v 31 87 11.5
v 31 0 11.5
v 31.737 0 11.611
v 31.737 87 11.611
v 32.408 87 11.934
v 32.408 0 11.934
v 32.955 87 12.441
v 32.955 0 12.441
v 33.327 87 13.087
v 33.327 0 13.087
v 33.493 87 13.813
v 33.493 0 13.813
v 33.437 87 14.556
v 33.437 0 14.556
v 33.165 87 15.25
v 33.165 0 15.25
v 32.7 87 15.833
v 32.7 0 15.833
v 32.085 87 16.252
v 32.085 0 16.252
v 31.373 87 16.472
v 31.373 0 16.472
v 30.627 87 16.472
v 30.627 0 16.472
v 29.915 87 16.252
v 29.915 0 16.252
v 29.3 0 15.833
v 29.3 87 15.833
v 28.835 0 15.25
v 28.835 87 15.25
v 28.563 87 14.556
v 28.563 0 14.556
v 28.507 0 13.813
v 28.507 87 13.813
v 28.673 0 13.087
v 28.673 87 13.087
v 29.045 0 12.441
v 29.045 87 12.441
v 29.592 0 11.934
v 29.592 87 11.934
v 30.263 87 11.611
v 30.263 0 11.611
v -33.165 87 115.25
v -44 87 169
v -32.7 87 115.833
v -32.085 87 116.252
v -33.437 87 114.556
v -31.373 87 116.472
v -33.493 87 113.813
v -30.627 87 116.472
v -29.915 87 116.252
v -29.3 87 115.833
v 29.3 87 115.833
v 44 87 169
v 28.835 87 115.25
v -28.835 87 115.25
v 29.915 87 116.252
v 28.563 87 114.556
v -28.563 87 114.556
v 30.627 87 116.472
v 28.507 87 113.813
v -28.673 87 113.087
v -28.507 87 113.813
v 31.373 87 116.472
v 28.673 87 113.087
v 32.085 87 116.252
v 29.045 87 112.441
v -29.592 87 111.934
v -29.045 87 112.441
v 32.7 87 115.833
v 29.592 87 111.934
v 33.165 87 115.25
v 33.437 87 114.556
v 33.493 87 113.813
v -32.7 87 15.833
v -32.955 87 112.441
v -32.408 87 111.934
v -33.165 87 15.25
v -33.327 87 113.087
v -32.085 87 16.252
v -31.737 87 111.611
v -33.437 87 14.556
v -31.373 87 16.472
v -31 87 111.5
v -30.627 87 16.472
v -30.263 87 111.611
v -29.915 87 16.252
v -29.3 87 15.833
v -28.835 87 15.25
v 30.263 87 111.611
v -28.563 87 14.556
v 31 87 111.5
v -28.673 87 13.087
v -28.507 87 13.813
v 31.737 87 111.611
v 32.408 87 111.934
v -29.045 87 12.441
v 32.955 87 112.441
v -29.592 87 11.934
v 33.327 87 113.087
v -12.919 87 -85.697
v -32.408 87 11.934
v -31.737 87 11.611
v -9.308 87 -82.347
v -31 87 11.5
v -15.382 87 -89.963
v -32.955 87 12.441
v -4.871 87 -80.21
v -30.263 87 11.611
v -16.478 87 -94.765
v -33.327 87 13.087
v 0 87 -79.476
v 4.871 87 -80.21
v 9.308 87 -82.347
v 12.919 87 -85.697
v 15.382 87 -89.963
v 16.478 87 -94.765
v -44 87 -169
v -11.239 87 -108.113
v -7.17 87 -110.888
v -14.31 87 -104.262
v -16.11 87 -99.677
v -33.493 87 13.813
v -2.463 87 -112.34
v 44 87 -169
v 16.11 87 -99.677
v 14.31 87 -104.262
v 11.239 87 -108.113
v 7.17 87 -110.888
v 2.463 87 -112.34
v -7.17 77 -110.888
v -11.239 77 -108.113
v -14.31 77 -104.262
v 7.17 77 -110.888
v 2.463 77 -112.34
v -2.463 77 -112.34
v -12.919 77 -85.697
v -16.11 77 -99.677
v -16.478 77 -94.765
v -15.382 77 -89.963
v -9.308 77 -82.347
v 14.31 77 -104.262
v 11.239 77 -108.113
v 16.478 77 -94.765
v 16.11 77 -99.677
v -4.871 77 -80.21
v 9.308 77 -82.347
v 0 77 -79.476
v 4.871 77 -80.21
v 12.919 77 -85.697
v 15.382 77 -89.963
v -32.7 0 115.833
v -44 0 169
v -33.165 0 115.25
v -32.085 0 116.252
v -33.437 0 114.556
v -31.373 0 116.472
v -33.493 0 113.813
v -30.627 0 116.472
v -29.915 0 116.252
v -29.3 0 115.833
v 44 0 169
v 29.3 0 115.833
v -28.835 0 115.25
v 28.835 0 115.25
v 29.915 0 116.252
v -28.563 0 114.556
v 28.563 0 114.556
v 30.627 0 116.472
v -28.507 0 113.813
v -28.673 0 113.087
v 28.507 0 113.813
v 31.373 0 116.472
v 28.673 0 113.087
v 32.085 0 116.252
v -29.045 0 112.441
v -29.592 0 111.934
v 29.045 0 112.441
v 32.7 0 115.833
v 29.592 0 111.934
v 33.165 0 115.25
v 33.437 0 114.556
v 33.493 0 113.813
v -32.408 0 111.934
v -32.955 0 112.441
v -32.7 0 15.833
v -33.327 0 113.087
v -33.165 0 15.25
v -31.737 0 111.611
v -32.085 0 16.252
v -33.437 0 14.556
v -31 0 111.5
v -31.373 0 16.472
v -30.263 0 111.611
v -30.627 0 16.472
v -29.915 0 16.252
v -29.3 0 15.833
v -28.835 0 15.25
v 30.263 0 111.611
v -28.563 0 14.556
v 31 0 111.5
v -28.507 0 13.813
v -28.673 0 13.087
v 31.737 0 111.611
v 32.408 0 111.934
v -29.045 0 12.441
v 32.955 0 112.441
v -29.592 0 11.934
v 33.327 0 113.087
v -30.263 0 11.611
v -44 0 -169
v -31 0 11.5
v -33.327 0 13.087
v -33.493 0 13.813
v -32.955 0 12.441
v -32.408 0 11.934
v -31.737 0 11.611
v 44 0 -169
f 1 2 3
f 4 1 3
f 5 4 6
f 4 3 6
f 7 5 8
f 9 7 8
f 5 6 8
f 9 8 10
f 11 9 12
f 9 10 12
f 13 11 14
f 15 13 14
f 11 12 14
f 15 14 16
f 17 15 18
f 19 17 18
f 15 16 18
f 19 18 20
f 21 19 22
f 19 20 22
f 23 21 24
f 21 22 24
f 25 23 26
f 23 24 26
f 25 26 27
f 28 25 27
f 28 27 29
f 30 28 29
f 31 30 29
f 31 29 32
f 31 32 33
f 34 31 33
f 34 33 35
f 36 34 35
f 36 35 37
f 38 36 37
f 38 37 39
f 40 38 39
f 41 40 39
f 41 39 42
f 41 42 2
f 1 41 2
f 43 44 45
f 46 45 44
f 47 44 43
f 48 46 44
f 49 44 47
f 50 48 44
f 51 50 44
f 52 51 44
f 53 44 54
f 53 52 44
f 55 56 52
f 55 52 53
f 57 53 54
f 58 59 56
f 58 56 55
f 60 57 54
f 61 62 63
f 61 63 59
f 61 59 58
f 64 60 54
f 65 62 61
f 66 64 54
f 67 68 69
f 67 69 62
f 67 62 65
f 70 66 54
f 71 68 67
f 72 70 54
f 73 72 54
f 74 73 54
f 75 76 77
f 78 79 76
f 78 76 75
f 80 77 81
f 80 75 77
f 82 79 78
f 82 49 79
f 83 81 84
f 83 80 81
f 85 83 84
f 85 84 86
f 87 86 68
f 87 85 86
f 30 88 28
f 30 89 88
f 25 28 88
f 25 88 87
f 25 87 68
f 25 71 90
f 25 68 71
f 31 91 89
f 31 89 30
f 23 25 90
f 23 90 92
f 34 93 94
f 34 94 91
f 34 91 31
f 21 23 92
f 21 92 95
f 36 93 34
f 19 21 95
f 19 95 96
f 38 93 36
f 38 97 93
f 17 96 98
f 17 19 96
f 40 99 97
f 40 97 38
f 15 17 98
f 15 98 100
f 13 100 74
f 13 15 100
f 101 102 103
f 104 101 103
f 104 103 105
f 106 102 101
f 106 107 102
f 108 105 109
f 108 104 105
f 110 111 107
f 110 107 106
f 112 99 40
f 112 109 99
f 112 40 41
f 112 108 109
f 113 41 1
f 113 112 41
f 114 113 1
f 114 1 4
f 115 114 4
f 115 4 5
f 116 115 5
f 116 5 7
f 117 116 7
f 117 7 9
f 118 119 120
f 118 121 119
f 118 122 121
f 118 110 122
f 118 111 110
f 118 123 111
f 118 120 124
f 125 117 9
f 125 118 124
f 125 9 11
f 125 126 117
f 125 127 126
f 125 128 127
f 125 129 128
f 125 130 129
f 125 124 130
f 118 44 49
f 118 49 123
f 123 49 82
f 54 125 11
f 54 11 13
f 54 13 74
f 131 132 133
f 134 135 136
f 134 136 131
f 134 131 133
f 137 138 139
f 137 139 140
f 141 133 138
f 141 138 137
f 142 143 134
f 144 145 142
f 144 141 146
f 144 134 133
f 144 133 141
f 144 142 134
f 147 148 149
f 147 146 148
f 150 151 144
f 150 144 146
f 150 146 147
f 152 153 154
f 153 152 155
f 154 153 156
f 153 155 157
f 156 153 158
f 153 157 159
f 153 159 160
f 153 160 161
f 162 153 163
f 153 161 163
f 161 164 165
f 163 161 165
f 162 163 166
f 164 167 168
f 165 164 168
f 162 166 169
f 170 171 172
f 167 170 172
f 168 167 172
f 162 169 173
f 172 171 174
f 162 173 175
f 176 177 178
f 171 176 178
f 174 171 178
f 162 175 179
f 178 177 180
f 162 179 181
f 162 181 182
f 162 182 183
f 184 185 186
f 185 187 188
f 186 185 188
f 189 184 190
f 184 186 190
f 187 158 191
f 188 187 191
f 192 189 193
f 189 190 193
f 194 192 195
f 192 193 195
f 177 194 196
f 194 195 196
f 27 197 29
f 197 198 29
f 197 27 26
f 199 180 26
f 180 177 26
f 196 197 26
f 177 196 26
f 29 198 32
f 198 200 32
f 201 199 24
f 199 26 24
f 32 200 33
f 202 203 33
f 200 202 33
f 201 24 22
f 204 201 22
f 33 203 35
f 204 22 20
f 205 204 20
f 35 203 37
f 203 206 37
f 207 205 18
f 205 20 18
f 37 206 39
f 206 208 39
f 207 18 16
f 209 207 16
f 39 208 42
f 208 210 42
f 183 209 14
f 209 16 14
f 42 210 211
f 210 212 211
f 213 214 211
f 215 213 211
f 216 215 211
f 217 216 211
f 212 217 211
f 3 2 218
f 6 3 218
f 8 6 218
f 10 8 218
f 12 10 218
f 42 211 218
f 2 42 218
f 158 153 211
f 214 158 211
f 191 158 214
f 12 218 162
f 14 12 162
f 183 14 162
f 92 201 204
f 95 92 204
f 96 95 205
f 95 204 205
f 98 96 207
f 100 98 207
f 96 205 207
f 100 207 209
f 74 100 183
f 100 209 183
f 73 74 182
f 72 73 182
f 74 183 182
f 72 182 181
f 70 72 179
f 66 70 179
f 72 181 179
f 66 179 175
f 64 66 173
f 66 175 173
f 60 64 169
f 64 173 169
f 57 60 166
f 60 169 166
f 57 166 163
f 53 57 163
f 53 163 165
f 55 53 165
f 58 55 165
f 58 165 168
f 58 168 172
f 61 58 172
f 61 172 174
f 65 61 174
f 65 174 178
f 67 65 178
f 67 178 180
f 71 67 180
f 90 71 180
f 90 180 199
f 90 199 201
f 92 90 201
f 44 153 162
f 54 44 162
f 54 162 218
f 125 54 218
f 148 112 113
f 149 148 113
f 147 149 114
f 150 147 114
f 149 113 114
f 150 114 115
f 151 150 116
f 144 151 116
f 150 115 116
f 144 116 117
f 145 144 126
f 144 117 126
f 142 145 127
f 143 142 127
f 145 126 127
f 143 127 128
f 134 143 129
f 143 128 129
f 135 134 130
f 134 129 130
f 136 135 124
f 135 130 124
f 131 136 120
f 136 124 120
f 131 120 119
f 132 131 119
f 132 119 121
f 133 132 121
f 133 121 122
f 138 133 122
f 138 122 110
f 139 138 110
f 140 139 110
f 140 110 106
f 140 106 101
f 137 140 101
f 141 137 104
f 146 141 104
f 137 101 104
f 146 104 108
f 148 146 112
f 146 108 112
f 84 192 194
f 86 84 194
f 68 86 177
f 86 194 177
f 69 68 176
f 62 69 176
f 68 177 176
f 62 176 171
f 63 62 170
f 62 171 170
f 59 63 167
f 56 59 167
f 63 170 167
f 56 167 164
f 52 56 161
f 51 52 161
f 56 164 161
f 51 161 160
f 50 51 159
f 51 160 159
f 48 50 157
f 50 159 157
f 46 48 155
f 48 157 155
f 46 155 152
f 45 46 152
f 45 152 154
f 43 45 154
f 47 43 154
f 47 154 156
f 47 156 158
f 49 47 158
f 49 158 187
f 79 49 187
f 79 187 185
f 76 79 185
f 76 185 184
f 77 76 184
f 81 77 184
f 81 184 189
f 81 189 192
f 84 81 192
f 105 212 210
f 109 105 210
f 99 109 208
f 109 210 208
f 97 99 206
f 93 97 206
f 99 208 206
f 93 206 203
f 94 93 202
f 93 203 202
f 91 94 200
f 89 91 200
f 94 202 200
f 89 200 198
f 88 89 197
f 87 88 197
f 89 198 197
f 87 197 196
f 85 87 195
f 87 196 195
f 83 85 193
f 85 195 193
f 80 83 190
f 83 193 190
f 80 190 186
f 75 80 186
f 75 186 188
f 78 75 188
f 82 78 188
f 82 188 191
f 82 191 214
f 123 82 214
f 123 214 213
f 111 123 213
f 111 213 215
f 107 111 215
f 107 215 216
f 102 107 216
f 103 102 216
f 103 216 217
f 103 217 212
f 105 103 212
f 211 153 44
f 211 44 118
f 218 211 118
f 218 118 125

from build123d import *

# Parameters (mm, degrees)
SKETCH_1_W                  = 88
SKETCH_1_H                  = 338
EXTRUDE_1_DEPTH             = 87
SKETCH_2_R                  = 2.5
CUT_EXTRUDE_1_DEPTH         = 196.105099882
PATTERN_LINEAR_1_COUNT      = 2
PATTERN_LINEAR_1_PITCH      = 100
PATTERN_LINEAR_1_COUNT_DIR2 = 2
PATTERN_LINEAR_1_PITCH_DIR2 = 62
SKETCH_3_R                  = 16.524250602
CUT_EXTRUDE_2_DEPTH         = 10


with BuildPart() as part:
    # 草图1 → 凸台-拉伸1 (new body)
    with BuildSketch(Plane(origin=(0, 0, 0), x_dir=(1, 0, 0), z_dir=(0, 1, 0))):
        Rectangle(SKETCH_1_W, SKETCH_1_H)
    extrude(amount=EXTRUDE_1_DEPTH)

    # 草图2 → 切除-拉伸1 (cut, through all)
    with BuildSketch(Plane.XZ):
        with Locations(Location((31, 114, 0), (0, 0, 270))):
            Circle(SKETCH_2_R)
    cut_extrude_1 = extrude(amount=-CUT_EXTRUDE_1_DEPTH, mode=Mode.SUBTRACT)

    # 阵列(线性)1: Cut-Extrude 1 2 × 2
    with Locations(*[(-j * PATTERN_LINEAR_1_PITCH_DIR2, 0, -i * PATTERN_LINEAR_1_PITCH) for i in range(PATTERN_LINEAR_1_COUNT) for j in range(PATTERN_LINEAR_1_COUNT_DIR2) if (i, j) != (0, 0)]):
        add(cut_extrude_1, mode=Mode.SUBTRACT)

    # 草图3 → 切除-拉伸2 (cut)
    with BuildSketch(Plane(origin=(0, 87, 0), x_dir=(1, 0, 0), z_dir=(0, 1, 0))):
        with Locations(Location((0, 96, 0), (0, 0, 270))):
            Circle(SKETCH_3_R)
    extrude(amount=-CUT_EXTRUDE_2_DEPTH, mode=Mode.SUBTRACT)


solid = part.part
